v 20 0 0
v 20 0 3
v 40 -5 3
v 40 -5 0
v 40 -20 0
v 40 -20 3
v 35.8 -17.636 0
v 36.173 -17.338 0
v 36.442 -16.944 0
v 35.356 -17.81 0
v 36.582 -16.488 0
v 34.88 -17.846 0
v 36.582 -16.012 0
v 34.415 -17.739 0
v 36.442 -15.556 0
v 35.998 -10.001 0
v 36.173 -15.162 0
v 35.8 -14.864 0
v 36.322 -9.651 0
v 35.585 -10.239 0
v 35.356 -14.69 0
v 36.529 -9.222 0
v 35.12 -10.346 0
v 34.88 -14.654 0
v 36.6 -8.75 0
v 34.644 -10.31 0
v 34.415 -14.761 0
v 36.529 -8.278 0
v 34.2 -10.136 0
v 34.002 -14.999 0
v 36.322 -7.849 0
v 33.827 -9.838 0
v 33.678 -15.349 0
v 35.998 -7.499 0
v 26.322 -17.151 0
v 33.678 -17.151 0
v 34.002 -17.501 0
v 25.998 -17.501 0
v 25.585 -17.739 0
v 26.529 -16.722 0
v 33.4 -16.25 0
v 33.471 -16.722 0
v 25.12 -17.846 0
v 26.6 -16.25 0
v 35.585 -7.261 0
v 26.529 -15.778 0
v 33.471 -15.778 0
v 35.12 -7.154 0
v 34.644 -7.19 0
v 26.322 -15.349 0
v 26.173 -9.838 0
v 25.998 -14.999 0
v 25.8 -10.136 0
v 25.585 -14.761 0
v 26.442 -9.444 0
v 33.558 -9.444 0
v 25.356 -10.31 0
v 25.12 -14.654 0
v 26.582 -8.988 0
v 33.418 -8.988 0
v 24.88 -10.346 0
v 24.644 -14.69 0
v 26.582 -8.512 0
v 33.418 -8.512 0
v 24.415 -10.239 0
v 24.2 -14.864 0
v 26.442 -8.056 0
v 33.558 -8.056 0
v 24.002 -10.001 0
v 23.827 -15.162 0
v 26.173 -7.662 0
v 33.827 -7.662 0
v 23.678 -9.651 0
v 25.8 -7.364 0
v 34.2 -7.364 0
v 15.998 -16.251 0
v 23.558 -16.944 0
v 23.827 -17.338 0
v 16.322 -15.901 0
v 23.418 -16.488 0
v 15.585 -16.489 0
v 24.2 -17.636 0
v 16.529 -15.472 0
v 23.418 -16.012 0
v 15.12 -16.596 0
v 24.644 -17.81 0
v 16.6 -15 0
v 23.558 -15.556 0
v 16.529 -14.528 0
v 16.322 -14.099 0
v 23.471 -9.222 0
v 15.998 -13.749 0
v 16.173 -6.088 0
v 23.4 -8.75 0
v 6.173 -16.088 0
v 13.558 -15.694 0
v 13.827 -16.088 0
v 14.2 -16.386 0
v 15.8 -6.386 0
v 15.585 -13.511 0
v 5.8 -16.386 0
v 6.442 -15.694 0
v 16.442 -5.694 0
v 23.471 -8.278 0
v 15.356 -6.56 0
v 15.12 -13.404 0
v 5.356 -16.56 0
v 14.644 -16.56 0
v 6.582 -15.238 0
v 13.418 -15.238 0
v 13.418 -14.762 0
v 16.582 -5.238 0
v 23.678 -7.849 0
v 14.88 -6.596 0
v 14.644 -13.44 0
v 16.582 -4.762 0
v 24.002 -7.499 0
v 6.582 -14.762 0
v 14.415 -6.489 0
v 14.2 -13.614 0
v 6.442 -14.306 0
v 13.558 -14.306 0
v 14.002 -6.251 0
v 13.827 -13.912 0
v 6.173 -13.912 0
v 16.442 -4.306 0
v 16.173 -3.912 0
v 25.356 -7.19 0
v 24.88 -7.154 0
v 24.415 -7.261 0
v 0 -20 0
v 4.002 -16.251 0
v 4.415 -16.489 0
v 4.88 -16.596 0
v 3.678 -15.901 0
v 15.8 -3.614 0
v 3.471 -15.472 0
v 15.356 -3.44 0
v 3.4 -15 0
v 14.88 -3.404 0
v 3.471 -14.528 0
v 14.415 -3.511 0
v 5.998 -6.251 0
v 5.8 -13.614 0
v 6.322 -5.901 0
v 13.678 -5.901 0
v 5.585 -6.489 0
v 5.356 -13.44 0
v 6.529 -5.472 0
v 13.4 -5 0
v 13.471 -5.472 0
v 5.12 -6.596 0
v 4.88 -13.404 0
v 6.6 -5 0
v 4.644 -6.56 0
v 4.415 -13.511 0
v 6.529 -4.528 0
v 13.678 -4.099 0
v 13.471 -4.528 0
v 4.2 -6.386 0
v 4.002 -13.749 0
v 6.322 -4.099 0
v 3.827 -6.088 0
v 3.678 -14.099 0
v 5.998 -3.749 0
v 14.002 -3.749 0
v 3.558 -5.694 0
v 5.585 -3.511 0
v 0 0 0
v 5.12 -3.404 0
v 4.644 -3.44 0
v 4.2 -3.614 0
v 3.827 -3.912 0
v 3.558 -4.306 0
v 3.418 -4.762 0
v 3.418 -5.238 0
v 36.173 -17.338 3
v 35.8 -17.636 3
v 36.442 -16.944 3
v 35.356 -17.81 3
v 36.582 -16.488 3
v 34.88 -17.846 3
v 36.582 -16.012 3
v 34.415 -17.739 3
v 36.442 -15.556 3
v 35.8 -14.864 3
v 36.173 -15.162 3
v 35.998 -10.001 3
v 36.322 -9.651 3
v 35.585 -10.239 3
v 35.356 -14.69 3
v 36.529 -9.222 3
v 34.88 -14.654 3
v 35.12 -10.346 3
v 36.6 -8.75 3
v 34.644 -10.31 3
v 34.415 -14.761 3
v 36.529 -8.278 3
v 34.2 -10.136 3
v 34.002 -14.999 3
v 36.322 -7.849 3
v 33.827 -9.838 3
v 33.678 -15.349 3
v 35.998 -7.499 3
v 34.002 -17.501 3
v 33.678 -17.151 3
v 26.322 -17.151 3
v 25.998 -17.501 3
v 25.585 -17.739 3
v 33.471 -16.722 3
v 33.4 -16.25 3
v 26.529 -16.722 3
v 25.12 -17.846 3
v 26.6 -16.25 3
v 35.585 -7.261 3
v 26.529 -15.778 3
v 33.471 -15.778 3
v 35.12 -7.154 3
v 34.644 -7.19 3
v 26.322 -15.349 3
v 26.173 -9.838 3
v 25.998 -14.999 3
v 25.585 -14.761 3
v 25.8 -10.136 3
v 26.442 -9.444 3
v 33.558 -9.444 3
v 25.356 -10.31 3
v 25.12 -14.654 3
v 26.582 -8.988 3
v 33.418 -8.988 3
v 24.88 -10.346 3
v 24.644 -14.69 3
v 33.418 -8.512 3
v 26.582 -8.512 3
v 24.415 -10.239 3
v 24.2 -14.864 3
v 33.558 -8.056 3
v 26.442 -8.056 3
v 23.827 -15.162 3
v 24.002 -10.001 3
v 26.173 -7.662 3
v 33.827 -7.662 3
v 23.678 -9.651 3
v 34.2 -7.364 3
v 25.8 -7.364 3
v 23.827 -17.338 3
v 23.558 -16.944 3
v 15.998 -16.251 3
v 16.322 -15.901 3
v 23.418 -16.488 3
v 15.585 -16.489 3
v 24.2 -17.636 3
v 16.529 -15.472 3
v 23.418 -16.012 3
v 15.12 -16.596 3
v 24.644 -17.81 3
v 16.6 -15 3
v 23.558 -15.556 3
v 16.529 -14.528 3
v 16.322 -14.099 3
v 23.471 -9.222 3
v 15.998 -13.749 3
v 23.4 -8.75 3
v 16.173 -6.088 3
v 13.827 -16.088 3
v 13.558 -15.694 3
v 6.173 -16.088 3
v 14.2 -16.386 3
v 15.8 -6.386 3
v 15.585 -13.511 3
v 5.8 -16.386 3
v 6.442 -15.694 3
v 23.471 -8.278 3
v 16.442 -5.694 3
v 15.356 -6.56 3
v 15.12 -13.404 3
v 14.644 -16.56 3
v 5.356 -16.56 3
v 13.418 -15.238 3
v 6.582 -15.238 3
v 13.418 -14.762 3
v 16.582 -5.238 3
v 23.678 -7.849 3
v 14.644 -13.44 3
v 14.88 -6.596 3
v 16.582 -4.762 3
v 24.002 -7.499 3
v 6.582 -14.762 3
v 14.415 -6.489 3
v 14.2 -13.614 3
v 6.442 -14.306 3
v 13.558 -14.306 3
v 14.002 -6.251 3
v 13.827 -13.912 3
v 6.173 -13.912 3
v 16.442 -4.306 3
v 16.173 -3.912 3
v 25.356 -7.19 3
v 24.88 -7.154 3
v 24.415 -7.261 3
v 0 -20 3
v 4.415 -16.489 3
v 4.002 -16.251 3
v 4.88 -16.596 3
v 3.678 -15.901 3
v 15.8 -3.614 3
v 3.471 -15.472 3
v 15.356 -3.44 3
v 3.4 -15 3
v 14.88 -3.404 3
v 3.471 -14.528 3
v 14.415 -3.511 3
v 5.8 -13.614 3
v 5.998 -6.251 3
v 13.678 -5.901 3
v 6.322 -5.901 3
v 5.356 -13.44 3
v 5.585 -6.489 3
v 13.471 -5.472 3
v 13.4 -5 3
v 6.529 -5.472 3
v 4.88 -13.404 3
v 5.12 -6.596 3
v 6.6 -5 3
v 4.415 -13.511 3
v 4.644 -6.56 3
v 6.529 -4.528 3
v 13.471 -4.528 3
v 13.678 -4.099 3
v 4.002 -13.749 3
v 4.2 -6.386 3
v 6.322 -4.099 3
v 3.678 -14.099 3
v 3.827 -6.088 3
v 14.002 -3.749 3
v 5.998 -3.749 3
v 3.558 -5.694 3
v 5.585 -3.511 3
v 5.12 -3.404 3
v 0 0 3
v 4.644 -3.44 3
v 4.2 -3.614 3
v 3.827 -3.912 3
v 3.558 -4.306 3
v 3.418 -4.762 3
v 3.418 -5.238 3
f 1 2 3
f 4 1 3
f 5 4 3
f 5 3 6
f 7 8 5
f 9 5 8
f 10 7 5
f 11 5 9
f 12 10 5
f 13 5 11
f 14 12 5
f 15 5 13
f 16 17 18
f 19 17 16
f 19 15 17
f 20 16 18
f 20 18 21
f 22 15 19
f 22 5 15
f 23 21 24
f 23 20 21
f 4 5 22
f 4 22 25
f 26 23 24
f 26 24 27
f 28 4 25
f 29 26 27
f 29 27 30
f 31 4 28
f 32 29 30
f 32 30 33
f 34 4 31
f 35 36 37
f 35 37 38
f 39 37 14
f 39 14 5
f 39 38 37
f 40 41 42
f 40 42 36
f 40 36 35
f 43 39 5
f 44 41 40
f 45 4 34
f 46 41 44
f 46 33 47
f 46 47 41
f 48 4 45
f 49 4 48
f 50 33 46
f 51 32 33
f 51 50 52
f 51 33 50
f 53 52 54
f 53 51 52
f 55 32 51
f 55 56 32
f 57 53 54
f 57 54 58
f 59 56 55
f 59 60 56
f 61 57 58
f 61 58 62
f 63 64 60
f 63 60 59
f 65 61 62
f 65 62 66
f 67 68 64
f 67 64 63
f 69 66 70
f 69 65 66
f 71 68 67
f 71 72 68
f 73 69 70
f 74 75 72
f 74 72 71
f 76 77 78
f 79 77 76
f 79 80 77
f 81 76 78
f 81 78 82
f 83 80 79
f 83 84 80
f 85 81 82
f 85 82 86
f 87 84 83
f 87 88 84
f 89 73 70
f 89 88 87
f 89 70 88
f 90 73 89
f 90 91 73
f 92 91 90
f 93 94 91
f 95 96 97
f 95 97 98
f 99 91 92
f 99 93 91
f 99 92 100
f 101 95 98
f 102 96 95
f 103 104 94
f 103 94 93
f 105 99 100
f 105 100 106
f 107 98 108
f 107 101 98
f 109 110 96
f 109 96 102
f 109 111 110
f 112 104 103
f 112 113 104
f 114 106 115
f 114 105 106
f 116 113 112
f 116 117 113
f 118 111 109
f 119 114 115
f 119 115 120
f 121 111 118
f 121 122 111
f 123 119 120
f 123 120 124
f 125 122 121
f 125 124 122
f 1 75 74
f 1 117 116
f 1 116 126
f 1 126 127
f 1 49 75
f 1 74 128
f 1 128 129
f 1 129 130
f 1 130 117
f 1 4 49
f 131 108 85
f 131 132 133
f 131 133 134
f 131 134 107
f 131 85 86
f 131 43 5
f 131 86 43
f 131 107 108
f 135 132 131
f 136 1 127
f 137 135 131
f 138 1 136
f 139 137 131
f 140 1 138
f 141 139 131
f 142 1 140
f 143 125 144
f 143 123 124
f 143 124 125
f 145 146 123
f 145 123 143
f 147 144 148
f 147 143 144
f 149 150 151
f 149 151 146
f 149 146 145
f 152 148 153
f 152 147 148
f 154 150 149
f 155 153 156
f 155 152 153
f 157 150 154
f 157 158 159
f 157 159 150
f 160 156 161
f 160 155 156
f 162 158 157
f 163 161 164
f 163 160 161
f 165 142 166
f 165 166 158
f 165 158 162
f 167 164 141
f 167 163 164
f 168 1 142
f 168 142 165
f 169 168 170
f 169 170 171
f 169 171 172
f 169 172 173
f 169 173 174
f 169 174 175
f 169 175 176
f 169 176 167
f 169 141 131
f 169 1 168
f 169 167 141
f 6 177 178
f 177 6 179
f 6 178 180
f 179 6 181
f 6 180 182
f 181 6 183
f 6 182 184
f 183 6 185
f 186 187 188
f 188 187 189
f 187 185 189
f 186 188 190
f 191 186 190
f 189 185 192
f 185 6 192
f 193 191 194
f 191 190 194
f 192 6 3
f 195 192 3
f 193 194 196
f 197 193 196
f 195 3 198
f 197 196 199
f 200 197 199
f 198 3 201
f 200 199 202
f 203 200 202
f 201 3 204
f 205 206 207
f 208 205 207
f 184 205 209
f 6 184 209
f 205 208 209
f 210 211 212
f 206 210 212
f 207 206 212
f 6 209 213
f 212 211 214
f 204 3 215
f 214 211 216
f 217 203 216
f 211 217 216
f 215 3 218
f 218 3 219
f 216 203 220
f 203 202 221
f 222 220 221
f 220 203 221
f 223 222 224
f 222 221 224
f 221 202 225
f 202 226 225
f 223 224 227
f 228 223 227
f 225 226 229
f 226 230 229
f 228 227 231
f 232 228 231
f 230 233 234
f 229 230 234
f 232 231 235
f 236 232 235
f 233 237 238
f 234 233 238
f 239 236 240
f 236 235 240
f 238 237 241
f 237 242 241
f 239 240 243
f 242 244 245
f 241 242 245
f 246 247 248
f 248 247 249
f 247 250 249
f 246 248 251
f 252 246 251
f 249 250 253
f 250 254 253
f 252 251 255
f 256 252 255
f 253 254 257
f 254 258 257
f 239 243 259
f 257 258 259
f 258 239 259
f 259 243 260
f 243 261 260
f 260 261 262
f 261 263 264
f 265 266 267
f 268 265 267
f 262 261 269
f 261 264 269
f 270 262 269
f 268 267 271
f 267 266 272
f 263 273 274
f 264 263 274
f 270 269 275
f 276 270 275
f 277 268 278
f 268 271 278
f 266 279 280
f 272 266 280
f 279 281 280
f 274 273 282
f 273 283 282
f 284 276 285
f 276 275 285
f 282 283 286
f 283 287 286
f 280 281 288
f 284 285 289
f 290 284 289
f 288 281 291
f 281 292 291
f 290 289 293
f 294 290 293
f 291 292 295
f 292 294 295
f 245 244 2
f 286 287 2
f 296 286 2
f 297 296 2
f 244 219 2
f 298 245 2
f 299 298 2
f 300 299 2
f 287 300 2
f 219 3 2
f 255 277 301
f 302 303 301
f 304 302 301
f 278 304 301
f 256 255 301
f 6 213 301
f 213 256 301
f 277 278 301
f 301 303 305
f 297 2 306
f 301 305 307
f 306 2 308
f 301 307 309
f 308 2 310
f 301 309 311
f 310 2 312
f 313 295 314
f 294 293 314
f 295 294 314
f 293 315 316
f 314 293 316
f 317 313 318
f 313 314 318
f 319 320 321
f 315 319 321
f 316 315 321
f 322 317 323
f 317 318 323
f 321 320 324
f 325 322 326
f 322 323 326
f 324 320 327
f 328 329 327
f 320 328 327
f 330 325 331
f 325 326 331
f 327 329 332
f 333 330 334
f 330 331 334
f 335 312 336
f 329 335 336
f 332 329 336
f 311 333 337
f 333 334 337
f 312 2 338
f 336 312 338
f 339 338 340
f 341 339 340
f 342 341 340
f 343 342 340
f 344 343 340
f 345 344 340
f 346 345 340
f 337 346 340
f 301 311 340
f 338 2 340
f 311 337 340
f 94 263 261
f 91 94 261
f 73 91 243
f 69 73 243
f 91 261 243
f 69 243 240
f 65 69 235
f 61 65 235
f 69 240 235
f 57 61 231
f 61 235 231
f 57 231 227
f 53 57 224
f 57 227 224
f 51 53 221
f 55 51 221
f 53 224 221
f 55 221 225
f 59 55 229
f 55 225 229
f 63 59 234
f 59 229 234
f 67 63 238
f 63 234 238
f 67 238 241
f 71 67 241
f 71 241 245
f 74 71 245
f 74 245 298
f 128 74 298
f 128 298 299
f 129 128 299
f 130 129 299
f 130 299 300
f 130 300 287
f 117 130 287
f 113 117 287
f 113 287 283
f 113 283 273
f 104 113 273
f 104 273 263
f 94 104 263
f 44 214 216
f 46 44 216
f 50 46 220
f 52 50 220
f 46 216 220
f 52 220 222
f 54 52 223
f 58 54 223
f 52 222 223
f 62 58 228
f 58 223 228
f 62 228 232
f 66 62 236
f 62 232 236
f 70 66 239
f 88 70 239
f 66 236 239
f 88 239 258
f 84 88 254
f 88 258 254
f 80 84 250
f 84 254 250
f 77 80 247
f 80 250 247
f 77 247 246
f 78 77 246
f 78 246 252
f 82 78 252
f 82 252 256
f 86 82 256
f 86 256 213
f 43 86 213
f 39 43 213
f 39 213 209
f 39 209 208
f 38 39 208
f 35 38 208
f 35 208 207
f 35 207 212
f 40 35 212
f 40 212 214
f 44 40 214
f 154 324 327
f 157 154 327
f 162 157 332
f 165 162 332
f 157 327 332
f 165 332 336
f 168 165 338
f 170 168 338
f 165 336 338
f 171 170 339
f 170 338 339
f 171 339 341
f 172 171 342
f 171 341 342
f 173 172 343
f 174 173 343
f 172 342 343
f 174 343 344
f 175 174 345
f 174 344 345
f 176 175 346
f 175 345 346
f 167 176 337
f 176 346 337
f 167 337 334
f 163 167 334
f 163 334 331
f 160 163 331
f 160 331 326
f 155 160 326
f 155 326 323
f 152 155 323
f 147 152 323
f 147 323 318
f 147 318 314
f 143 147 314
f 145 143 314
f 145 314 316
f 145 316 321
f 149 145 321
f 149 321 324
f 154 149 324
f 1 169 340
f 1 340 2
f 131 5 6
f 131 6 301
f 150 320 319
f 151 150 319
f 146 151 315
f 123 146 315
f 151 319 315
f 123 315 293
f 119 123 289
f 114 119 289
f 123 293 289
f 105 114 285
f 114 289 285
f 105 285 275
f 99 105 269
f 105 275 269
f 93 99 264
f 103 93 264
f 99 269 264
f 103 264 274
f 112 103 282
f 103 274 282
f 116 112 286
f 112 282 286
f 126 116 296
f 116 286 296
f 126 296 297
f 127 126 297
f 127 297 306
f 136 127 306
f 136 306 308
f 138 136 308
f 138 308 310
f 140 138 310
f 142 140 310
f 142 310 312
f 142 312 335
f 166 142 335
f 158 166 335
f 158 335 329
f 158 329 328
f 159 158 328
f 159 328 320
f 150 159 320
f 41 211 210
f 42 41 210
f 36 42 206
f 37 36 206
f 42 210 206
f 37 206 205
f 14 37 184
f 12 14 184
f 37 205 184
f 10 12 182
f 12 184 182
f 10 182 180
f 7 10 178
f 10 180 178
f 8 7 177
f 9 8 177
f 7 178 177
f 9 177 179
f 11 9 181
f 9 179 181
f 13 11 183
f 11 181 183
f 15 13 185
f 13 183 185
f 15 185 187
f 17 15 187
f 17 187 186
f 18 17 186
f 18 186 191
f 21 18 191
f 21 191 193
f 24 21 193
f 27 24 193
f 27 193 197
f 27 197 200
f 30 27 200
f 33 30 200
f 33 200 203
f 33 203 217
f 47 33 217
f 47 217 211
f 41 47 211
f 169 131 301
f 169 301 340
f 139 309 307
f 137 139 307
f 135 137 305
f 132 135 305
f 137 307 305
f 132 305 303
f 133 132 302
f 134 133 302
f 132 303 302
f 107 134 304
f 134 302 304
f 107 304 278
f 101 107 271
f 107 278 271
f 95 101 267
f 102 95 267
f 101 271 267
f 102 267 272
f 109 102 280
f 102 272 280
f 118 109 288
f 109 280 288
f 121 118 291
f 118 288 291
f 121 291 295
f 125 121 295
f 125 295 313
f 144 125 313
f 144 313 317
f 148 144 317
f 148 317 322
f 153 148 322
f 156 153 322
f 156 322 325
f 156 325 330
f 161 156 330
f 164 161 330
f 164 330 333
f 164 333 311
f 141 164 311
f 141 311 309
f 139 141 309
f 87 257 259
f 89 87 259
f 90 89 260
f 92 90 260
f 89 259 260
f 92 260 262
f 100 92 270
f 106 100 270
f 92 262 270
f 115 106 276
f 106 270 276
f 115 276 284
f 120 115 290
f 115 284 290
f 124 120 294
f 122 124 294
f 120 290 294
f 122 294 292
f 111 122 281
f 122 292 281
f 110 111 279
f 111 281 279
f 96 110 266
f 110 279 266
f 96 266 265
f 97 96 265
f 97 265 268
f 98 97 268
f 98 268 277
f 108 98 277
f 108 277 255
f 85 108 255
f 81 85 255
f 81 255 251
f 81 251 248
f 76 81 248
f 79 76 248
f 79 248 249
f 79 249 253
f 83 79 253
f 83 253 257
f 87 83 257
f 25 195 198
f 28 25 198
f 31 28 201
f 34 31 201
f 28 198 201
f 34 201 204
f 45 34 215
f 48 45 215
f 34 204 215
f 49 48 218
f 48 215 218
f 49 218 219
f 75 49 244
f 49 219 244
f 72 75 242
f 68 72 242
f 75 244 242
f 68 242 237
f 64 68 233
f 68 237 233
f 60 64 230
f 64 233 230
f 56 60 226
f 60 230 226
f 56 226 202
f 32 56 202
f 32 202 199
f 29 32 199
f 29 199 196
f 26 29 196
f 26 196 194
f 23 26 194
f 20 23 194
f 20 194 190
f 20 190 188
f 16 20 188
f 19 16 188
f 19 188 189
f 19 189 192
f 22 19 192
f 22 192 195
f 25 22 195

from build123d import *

# Parameters (mm, degrees)
EXTRUDE_1_DEPTH     = 3
SKETCH_2_R          = 1.6
CUT_EXTRUDE_1_DEPTH = 45.821869662
EXTRUDE_2_DEPTH     = 3


with BuildPart() as part:
    # 草图1 → 凸台-拉伸1 (new body)
    with BuildSketch(Plane.XY):
        Polygon((0, 0), (20, 0), (20, -5), (40, -5), (40, -20), (0, -20), align=None)
    extrude(amount=EXTRUDE_1_DEPTH)

    # 草图2 → 切除-拉伸1 (cut, through all)
    with BuildSketch(Plane.XY.offset(3)):
        with Locations((5, -5)):
            Circle(SKETCH_2_R)
        with Locations((35, -8.75)):
            Circle(SKETCH_2_R)
        with Locations(Location((5, -15, 0), (0, 0, 180))):
            Circle(SKETCH_2_R)
        with Locations(Location((15, -5, 0), (0, 0, 180))):
            Circle(SKETCH_2_R)
        with Locations((15, -15)):
            Circle(SKETCH_2_R)
        with Locations(Location((35, -16.25, 0), (0, 0, 180))):
            Circle(SKETCH_2_R)
        with Locations((25, -16.25)):
            Circle(SKETCH_2_R)
        with Locations(Location((25, -8.75, 0), (0, 0, 180))):
            Circle(SKETCH_2_R)
    extrude(amount=-CUT_EXTRUDE_1_DEPTH, mode=Mode.SUBTRACT)

    # 草图4 → 凸台-拉伸2 (add)
    with BuildSketch(Plane.XY.offset(3)):
        Polygon((20, 0), (40, -5), (20, -5), align=None)
    extrude(amount=-EXTRUDE_2_DEPTH)


solid = part.part
